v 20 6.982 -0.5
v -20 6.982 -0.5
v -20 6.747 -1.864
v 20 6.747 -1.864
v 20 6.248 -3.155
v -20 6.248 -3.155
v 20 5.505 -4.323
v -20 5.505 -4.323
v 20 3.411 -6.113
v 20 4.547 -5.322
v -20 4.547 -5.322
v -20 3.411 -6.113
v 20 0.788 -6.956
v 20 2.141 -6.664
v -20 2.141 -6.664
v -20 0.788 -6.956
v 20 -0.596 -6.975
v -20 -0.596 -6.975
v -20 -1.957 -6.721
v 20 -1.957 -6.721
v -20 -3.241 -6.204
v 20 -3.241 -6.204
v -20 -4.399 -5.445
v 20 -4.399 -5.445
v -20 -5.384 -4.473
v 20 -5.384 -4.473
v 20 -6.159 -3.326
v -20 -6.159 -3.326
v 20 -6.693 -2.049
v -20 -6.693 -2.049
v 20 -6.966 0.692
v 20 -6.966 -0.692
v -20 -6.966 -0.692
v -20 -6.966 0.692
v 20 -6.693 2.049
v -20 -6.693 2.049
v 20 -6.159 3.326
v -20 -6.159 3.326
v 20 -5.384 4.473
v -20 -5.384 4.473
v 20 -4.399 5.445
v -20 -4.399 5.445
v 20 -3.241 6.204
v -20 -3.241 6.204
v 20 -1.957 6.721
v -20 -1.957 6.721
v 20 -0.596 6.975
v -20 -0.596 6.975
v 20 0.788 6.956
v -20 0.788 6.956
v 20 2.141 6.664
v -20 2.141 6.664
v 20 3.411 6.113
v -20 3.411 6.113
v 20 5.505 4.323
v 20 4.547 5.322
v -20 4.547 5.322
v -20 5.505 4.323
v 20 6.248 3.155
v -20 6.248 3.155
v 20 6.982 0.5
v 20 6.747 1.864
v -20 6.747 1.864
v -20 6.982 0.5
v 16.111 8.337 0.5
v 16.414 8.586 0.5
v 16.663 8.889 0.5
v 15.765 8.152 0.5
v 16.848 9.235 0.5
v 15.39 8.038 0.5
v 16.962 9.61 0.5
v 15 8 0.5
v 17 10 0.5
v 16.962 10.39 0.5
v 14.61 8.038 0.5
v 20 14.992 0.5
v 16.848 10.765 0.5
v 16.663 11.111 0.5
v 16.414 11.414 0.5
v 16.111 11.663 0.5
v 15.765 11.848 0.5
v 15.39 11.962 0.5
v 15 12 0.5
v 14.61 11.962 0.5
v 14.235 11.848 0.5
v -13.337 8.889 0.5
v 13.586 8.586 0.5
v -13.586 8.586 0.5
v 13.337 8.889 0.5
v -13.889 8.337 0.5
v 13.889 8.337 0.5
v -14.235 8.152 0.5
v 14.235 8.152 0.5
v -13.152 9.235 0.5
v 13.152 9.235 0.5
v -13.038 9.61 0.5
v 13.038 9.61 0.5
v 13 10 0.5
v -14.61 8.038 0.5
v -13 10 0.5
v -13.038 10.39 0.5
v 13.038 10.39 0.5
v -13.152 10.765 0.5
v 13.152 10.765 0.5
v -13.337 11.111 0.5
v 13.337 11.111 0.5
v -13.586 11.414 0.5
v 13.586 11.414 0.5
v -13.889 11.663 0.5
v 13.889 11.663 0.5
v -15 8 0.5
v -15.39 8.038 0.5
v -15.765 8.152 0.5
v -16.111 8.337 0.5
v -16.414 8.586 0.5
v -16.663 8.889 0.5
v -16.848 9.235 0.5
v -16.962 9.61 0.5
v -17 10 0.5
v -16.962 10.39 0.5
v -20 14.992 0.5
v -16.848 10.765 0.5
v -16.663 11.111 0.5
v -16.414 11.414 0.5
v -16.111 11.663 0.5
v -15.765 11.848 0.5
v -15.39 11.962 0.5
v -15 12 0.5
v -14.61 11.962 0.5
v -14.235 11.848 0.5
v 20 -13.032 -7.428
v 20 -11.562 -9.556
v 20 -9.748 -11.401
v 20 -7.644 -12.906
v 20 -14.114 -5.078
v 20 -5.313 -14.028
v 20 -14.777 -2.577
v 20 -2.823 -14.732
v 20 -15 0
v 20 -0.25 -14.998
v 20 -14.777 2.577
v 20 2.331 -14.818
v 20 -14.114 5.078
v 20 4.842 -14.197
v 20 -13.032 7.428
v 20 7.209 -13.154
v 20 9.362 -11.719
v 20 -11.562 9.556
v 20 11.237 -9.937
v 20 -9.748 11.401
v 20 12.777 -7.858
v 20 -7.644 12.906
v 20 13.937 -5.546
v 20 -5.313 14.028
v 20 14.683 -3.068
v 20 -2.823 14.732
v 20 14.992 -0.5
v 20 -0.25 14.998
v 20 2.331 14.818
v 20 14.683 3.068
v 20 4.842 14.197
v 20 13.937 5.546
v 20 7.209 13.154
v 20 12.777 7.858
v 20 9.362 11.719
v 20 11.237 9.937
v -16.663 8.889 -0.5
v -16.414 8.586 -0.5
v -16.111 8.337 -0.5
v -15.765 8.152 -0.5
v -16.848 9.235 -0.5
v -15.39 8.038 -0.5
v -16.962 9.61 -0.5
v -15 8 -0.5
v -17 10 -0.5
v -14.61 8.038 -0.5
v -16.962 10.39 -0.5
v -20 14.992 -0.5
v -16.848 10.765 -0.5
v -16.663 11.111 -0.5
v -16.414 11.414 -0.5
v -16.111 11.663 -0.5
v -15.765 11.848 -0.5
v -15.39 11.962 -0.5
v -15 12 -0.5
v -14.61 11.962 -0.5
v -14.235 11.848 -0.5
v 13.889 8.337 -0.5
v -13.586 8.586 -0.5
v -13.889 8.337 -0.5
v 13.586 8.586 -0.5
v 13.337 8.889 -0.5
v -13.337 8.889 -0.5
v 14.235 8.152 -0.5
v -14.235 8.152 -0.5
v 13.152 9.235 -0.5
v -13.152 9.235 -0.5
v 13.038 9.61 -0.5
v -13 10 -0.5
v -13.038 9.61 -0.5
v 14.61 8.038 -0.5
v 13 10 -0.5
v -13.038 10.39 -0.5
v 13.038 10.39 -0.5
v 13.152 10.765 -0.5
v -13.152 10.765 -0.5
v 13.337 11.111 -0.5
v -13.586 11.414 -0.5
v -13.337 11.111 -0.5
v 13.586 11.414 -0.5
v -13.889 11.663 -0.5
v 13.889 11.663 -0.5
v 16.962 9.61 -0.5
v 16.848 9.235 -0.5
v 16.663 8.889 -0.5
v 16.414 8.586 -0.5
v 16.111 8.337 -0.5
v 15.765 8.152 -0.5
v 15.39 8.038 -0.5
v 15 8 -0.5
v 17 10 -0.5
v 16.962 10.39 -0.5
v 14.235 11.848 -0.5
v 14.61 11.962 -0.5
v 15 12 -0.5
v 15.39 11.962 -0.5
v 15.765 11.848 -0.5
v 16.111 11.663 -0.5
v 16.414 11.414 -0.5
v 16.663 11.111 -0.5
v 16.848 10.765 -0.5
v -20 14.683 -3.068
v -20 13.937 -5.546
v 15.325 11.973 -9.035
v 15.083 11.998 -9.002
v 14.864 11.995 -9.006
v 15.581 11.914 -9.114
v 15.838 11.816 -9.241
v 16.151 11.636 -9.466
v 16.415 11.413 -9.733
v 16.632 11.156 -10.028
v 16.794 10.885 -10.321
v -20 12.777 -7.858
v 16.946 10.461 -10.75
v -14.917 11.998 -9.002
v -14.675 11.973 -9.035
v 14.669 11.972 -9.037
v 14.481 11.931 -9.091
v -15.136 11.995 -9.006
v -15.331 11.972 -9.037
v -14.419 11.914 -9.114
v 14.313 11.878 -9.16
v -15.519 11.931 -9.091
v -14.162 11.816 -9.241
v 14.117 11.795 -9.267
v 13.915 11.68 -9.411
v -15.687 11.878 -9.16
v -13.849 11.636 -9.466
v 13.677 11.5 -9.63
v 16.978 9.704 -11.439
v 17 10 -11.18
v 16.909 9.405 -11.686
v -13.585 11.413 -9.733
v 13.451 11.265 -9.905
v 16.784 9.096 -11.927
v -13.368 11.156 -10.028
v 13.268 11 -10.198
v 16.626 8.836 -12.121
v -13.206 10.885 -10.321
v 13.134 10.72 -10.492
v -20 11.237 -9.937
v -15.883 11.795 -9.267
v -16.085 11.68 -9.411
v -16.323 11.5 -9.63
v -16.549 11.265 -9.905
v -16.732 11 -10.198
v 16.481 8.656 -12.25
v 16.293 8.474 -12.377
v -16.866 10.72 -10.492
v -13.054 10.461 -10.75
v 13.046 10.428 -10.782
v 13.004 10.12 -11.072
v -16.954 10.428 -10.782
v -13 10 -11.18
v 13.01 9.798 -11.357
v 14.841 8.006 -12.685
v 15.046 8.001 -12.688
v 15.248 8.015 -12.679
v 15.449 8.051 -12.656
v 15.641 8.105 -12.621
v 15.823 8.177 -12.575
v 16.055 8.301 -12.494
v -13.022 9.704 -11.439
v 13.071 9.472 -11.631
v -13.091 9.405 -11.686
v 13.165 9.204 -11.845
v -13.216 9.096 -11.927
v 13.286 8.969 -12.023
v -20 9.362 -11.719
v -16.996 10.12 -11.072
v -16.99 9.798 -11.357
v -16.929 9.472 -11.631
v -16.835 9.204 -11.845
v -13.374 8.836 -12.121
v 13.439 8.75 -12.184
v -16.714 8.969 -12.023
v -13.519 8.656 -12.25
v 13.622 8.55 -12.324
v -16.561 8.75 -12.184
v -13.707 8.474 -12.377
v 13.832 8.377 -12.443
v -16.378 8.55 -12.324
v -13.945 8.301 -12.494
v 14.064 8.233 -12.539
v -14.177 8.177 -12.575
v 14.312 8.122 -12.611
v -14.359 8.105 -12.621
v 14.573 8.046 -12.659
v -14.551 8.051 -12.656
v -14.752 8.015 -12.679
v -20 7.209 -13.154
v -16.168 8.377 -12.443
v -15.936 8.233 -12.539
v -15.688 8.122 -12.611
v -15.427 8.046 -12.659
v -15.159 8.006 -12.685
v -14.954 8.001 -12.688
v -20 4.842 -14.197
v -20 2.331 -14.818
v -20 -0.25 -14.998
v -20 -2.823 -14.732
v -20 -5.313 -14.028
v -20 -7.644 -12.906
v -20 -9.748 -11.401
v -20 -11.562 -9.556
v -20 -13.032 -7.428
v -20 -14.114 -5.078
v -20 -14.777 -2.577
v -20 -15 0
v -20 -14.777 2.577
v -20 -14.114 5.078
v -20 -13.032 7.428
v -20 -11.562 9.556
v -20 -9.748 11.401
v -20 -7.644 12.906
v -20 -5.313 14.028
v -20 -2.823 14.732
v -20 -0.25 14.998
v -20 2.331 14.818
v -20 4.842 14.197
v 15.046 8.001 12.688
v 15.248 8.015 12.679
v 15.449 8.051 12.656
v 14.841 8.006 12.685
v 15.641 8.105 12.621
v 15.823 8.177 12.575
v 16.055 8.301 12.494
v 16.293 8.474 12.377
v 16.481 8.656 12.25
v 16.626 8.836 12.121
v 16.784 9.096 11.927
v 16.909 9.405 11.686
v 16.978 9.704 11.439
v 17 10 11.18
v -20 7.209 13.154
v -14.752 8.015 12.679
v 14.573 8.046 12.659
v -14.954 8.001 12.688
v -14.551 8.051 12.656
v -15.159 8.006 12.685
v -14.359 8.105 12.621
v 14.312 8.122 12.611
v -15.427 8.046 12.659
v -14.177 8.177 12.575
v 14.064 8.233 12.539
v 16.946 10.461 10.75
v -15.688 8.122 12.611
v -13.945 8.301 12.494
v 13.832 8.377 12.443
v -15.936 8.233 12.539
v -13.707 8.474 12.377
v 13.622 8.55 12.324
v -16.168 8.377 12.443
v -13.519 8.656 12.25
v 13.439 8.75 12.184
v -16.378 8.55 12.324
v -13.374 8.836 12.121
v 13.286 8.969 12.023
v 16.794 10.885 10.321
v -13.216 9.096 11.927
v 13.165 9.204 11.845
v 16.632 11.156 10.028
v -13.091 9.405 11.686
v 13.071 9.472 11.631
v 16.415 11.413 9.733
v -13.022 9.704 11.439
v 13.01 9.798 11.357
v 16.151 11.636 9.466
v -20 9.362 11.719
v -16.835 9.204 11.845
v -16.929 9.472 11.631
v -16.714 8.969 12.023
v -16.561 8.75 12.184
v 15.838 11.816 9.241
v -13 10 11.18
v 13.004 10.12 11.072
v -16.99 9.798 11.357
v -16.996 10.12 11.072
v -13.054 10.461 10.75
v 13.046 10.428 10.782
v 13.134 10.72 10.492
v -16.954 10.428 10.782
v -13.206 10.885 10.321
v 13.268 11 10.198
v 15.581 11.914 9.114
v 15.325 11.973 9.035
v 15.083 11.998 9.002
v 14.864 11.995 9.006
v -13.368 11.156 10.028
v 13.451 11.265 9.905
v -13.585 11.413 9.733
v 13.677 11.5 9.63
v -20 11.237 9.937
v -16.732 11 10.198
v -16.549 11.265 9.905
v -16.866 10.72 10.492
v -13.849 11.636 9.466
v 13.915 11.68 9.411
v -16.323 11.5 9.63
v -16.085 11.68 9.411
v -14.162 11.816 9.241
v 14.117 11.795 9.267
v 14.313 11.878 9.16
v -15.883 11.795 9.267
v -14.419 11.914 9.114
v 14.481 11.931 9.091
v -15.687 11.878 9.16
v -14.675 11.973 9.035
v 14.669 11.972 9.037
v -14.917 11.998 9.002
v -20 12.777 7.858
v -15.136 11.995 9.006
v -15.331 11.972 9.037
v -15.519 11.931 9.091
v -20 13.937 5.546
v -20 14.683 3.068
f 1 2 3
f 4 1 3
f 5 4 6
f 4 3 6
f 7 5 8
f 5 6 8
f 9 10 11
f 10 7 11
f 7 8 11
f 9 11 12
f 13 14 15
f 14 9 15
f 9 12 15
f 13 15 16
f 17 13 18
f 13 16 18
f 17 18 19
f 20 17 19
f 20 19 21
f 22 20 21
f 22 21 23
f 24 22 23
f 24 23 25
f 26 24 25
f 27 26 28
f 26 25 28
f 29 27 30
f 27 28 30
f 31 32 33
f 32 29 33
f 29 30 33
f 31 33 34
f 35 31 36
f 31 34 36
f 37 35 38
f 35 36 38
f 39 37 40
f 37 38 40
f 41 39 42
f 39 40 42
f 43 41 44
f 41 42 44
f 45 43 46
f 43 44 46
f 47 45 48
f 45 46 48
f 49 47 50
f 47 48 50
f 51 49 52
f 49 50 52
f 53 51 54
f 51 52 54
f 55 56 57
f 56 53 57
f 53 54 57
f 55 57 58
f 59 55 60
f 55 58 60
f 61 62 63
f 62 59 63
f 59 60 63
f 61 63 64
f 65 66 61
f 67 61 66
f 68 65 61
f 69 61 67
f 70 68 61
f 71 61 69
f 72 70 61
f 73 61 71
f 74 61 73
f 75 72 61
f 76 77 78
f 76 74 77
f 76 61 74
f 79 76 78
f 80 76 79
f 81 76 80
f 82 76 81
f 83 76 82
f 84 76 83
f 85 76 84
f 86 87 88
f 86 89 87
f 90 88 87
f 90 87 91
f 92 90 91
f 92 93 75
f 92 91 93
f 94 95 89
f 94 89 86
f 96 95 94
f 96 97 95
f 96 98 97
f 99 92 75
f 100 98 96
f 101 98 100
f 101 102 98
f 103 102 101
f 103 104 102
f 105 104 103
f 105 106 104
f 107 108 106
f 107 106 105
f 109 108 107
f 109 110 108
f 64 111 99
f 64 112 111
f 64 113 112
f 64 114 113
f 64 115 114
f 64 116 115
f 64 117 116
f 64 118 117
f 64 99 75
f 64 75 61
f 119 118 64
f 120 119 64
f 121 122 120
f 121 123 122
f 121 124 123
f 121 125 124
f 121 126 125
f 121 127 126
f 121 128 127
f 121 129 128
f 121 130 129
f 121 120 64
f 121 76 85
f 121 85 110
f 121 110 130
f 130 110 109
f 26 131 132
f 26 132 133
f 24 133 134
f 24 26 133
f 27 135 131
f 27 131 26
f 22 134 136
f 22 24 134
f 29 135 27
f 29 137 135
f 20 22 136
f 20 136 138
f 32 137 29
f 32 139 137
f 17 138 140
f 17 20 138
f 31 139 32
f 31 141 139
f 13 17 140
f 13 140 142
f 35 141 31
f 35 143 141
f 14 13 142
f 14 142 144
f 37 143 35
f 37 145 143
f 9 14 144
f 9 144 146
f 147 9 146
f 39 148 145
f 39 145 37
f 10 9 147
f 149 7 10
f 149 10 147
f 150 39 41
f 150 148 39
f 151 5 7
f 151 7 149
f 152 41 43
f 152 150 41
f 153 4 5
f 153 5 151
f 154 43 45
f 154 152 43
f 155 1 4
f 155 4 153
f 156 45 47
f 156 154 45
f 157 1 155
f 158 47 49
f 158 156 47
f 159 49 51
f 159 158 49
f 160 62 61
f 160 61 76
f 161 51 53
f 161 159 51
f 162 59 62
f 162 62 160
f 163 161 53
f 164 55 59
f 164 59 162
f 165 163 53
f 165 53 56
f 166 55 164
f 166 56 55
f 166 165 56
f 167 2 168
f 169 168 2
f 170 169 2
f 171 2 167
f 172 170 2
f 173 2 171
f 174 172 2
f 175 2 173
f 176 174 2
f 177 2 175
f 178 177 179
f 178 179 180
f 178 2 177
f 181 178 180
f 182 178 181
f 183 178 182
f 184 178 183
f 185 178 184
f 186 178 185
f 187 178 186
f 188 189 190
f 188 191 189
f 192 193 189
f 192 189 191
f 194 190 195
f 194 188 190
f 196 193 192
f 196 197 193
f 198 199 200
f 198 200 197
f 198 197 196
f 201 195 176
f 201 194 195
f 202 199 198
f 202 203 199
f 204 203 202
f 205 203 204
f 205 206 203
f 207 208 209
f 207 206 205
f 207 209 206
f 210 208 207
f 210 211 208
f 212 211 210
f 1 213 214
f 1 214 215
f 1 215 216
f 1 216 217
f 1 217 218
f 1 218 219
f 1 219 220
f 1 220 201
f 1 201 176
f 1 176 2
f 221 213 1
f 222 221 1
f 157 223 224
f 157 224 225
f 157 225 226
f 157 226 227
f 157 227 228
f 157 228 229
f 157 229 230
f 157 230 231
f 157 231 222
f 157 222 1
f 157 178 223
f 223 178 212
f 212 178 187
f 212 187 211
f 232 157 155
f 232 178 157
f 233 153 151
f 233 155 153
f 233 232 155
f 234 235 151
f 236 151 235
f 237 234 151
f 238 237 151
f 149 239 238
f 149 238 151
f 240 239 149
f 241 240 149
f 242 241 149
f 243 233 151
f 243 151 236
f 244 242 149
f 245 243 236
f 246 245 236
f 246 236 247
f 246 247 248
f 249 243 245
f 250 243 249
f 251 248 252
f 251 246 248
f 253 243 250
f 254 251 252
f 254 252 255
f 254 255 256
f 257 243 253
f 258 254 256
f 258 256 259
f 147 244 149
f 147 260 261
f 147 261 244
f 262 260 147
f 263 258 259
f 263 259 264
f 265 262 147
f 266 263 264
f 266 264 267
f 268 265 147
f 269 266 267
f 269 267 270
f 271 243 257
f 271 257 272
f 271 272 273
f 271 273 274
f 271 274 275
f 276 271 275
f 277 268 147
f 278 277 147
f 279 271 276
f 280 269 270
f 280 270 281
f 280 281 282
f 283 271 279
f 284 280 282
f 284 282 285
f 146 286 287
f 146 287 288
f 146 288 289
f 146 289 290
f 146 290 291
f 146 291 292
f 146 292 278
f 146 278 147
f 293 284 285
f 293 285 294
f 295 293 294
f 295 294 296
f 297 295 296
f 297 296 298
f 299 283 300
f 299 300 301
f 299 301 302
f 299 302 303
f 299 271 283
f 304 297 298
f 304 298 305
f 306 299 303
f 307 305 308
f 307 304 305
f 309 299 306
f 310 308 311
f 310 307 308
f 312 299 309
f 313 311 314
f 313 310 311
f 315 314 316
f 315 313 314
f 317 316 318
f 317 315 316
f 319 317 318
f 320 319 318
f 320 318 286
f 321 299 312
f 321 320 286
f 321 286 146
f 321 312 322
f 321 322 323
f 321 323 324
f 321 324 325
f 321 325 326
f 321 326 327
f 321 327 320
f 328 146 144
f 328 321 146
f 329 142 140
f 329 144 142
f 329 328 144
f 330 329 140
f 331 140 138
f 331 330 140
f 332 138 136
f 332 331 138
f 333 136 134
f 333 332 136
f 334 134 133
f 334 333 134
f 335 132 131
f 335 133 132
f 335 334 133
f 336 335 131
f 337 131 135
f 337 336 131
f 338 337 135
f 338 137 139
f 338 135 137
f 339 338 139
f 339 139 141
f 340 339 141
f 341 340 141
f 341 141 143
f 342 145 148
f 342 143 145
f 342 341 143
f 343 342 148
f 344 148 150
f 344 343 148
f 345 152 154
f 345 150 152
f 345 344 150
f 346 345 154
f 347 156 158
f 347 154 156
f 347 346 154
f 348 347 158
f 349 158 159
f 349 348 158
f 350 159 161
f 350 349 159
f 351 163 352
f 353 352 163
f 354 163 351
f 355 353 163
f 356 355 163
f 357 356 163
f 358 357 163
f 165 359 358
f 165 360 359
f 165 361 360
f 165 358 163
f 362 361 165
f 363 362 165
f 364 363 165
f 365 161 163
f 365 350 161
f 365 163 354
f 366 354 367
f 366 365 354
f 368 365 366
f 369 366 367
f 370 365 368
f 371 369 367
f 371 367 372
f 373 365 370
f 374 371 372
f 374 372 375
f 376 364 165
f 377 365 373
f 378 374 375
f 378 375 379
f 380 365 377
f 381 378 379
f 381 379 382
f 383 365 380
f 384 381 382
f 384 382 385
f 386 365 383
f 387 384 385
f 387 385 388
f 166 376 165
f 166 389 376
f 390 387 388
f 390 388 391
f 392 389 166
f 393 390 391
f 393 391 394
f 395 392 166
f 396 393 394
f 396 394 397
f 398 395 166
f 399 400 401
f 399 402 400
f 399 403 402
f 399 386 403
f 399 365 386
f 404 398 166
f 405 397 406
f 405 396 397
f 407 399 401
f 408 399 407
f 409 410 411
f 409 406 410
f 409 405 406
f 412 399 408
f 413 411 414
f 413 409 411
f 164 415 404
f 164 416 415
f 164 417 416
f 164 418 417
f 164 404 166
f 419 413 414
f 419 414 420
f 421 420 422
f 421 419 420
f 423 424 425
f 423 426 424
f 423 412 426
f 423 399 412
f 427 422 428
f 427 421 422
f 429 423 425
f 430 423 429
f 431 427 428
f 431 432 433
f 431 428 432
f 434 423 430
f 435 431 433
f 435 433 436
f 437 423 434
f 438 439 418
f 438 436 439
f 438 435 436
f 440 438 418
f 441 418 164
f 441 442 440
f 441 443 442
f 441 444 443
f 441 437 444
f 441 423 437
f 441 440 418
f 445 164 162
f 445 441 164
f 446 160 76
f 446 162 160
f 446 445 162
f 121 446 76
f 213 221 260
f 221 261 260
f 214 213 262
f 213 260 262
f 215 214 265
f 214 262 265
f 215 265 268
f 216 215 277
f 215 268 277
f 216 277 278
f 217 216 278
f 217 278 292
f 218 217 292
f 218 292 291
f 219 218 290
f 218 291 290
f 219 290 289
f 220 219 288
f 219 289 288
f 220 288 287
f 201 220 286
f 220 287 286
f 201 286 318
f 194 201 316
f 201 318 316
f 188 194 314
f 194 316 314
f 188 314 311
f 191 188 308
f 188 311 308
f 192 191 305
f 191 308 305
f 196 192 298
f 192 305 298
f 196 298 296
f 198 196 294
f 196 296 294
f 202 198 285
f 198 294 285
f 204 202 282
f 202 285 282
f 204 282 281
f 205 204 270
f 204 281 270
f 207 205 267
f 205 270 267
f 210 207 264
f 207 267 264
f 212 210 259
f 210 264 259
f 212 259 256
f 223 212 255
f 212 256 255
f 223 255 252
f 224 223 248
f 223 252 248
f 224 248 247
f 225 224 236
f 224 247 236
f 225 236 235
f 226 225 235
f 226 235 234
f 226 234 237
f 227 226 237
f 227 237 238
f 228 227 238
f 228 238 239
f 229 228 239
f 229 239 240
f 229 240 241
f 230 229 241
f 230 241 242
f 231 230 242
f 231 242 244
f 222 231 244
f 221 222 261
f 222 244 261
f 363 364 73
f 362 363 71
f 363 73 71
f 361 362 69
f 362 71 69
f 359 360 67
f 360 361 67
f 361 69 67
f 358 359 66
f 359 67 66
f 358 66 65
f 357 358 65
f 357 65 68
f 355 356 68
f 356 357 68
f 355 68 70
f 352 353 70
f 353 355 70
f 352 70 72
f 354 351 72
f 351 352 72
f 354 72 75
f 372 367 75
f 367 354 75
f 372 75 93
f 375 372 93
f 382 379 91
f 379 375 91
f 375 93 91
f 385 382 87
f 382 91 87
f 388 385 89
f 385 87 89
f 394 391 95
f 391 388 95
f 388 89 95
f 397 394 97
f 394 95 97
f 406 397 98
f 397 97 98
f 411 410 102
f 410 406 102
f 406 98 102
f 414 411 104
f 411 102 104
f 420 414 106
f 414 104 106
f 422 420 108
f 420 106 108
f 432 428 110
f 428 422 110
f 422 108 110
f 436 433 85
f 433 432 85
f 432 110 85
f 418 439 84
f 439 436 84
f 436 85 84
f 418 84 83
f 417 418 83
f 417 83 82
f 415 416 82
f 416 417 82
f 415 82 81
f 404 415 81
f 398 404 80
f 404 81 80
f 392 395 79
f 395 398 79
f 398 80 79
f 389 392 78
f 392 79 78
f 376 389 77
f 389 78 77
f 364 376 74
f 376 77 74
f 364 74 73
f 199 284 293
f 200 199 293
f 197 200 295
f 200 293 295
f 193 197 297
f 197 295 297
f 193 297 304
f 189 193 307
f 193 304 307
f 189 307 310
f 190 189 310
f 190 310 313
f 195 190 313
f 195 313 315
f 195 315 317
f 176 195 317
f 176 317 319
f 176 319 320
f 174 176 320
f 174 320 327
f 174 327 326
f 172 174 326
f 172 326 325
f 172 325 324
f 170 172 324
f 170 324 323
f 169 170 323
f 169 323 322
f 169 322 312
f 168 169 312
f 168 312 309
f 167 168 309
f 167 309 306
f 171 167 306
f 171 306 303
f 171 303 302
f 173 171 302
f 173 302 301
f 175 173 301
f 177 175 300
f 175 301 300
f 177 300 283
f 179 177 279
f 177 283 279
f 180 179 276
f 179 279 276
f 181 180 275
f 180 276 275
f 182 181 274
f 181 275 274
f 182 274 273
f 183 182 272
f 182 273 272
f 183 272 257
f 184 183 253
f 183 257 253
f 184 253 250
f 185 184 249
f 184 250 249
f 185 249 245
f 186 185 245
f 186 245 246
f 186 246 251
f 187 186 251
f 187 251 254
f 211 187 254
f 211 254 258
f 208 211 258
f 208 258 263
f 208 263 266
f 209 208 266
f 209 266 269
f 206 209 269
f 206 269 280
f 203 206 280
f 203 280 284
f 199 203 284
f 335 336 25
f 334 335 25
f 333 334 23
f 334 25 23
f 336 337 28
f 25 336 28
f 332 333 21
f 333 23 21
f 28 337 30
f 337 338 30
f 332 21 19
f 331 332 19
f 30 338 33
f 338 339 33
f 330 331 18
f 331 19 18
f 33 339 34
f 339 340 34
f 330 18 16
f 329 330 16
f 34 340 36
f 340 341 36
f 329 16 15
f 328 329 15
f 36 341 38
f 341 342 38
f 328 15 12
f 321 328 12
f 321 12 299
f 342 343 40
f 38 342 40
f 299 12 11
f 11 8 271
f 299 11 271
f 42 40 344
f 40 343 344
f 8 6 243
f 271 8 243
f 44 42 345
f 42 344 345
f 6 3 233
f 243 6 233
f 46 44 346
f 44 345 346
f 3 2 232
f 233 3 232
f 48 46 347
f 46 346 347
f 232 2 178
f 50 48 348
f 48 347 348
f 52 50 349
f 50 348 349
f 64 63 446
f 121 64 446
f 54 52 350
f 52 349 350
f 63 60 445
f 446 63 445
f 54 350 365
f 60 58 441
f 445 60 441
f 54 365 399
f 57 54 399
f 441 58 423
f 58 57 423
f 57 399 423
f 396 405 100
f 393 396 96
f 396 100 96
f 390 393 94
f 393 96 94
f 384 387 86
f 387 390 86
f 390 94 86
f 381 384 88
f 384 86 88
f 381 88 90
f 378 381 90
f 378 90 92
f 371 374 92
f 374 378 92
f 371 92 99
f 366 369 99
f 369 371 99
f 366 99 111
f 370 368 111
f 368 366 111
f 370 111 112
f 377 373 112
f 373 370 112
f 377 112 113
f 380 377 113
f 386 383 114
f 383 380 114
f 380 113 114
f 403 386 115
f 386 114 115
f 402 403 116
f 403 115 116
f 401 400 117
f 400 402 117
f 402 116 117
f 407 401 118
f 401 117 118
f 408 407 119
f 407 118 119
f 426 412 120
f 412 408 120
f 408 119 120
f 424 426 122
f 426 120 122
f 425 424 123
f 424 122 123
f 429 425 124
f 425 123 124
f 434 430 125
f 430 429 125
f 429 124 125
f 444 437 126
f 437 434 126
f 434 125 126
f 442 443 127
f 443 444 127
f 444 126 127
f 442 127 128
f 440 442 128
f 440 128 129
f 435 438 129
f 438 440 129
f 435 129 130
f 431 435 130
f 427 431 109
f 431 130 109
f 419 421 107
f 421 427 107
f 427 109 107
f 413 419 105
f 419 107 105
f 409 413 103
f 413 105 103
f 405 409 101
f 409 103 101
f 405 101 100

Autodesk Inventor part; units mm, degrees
ref_plane "YZ Plane" through (0, 0, 0) normal (1, 0, 0) x (0, 1, 0)
sketch "Sketch1" plane through (0, 0, 0) normal (1, 0, 0) x (0, 1, 0)
  circle A0 centre (0, 0) radius 7
  circle A1 centre (0, 0) radius 15
  dimension "d0" = 14
  dimension "d1" = 30
extrude "Extrusion1" add sketch "Sketch1" along normal blind 20 and the other way blind 20
ref_plane "Work Plane1" through (0, 15, 0) normal (0, 1, 0) x (-1, 0, 0)
sketch "Sketch3" plane through (0, 15, 0) normal (0, 1, 0) x (-1, 0, 0)
  line L0 (-20, 0) -> (20, 0) construction
  line L1 (-20, 15) -> (-20, -15) projected
  line L2 (20, 7) -> (20, -7) projected
  line L3 (-20, 0.5) -> (20, 0.5)
  line L4 (20, 0.5) -> (20, -0.5)
  line L5 (20, -0.5) -> (-20, -0.5)
  line L6 (-20, -0.5) -> (-20, 0.5)
  point P0 (0, 0)
  dimension "d10" = 0.5
  dimension "d11" = 0.5
extrude "Extrusion2" cut sketch "Sketch3" against normal up to next
ref_plane "Work Plane2" through (0, 0, -15) normal (0, 0, 1) x (1, 0, 0)
sketch "Sketch4" plane through (0, 0, -15) normal (0, 0, 1) x (1, 0, 0)
  line L0 (-20, -7) -> (-20, 6.9821) construction
  line L1 (-20, 0) -> (20, 0) construction
  line L2 (20, 6.9821) -> (20, -7) construction
  circle A0 centre (-15, 10) radius 2
  line L3 (-20, 14.9917) -> (20, 14.9917) construction
  line L4 (0, 14.9917) -> (0, -15) construction
  line L5 (-20, -15) -> (20, -15) construction
  circle A1 centre (15, 10) radius 2
  point P0 (0, 0)
  dimension "d14" = 10
  dimension "d15" = 15
  dimension "d16" = 4
extrude "Extrusion3" cut sketch "Sketch4" along normal through all
properties part number "14mm_shaft_coupler"
